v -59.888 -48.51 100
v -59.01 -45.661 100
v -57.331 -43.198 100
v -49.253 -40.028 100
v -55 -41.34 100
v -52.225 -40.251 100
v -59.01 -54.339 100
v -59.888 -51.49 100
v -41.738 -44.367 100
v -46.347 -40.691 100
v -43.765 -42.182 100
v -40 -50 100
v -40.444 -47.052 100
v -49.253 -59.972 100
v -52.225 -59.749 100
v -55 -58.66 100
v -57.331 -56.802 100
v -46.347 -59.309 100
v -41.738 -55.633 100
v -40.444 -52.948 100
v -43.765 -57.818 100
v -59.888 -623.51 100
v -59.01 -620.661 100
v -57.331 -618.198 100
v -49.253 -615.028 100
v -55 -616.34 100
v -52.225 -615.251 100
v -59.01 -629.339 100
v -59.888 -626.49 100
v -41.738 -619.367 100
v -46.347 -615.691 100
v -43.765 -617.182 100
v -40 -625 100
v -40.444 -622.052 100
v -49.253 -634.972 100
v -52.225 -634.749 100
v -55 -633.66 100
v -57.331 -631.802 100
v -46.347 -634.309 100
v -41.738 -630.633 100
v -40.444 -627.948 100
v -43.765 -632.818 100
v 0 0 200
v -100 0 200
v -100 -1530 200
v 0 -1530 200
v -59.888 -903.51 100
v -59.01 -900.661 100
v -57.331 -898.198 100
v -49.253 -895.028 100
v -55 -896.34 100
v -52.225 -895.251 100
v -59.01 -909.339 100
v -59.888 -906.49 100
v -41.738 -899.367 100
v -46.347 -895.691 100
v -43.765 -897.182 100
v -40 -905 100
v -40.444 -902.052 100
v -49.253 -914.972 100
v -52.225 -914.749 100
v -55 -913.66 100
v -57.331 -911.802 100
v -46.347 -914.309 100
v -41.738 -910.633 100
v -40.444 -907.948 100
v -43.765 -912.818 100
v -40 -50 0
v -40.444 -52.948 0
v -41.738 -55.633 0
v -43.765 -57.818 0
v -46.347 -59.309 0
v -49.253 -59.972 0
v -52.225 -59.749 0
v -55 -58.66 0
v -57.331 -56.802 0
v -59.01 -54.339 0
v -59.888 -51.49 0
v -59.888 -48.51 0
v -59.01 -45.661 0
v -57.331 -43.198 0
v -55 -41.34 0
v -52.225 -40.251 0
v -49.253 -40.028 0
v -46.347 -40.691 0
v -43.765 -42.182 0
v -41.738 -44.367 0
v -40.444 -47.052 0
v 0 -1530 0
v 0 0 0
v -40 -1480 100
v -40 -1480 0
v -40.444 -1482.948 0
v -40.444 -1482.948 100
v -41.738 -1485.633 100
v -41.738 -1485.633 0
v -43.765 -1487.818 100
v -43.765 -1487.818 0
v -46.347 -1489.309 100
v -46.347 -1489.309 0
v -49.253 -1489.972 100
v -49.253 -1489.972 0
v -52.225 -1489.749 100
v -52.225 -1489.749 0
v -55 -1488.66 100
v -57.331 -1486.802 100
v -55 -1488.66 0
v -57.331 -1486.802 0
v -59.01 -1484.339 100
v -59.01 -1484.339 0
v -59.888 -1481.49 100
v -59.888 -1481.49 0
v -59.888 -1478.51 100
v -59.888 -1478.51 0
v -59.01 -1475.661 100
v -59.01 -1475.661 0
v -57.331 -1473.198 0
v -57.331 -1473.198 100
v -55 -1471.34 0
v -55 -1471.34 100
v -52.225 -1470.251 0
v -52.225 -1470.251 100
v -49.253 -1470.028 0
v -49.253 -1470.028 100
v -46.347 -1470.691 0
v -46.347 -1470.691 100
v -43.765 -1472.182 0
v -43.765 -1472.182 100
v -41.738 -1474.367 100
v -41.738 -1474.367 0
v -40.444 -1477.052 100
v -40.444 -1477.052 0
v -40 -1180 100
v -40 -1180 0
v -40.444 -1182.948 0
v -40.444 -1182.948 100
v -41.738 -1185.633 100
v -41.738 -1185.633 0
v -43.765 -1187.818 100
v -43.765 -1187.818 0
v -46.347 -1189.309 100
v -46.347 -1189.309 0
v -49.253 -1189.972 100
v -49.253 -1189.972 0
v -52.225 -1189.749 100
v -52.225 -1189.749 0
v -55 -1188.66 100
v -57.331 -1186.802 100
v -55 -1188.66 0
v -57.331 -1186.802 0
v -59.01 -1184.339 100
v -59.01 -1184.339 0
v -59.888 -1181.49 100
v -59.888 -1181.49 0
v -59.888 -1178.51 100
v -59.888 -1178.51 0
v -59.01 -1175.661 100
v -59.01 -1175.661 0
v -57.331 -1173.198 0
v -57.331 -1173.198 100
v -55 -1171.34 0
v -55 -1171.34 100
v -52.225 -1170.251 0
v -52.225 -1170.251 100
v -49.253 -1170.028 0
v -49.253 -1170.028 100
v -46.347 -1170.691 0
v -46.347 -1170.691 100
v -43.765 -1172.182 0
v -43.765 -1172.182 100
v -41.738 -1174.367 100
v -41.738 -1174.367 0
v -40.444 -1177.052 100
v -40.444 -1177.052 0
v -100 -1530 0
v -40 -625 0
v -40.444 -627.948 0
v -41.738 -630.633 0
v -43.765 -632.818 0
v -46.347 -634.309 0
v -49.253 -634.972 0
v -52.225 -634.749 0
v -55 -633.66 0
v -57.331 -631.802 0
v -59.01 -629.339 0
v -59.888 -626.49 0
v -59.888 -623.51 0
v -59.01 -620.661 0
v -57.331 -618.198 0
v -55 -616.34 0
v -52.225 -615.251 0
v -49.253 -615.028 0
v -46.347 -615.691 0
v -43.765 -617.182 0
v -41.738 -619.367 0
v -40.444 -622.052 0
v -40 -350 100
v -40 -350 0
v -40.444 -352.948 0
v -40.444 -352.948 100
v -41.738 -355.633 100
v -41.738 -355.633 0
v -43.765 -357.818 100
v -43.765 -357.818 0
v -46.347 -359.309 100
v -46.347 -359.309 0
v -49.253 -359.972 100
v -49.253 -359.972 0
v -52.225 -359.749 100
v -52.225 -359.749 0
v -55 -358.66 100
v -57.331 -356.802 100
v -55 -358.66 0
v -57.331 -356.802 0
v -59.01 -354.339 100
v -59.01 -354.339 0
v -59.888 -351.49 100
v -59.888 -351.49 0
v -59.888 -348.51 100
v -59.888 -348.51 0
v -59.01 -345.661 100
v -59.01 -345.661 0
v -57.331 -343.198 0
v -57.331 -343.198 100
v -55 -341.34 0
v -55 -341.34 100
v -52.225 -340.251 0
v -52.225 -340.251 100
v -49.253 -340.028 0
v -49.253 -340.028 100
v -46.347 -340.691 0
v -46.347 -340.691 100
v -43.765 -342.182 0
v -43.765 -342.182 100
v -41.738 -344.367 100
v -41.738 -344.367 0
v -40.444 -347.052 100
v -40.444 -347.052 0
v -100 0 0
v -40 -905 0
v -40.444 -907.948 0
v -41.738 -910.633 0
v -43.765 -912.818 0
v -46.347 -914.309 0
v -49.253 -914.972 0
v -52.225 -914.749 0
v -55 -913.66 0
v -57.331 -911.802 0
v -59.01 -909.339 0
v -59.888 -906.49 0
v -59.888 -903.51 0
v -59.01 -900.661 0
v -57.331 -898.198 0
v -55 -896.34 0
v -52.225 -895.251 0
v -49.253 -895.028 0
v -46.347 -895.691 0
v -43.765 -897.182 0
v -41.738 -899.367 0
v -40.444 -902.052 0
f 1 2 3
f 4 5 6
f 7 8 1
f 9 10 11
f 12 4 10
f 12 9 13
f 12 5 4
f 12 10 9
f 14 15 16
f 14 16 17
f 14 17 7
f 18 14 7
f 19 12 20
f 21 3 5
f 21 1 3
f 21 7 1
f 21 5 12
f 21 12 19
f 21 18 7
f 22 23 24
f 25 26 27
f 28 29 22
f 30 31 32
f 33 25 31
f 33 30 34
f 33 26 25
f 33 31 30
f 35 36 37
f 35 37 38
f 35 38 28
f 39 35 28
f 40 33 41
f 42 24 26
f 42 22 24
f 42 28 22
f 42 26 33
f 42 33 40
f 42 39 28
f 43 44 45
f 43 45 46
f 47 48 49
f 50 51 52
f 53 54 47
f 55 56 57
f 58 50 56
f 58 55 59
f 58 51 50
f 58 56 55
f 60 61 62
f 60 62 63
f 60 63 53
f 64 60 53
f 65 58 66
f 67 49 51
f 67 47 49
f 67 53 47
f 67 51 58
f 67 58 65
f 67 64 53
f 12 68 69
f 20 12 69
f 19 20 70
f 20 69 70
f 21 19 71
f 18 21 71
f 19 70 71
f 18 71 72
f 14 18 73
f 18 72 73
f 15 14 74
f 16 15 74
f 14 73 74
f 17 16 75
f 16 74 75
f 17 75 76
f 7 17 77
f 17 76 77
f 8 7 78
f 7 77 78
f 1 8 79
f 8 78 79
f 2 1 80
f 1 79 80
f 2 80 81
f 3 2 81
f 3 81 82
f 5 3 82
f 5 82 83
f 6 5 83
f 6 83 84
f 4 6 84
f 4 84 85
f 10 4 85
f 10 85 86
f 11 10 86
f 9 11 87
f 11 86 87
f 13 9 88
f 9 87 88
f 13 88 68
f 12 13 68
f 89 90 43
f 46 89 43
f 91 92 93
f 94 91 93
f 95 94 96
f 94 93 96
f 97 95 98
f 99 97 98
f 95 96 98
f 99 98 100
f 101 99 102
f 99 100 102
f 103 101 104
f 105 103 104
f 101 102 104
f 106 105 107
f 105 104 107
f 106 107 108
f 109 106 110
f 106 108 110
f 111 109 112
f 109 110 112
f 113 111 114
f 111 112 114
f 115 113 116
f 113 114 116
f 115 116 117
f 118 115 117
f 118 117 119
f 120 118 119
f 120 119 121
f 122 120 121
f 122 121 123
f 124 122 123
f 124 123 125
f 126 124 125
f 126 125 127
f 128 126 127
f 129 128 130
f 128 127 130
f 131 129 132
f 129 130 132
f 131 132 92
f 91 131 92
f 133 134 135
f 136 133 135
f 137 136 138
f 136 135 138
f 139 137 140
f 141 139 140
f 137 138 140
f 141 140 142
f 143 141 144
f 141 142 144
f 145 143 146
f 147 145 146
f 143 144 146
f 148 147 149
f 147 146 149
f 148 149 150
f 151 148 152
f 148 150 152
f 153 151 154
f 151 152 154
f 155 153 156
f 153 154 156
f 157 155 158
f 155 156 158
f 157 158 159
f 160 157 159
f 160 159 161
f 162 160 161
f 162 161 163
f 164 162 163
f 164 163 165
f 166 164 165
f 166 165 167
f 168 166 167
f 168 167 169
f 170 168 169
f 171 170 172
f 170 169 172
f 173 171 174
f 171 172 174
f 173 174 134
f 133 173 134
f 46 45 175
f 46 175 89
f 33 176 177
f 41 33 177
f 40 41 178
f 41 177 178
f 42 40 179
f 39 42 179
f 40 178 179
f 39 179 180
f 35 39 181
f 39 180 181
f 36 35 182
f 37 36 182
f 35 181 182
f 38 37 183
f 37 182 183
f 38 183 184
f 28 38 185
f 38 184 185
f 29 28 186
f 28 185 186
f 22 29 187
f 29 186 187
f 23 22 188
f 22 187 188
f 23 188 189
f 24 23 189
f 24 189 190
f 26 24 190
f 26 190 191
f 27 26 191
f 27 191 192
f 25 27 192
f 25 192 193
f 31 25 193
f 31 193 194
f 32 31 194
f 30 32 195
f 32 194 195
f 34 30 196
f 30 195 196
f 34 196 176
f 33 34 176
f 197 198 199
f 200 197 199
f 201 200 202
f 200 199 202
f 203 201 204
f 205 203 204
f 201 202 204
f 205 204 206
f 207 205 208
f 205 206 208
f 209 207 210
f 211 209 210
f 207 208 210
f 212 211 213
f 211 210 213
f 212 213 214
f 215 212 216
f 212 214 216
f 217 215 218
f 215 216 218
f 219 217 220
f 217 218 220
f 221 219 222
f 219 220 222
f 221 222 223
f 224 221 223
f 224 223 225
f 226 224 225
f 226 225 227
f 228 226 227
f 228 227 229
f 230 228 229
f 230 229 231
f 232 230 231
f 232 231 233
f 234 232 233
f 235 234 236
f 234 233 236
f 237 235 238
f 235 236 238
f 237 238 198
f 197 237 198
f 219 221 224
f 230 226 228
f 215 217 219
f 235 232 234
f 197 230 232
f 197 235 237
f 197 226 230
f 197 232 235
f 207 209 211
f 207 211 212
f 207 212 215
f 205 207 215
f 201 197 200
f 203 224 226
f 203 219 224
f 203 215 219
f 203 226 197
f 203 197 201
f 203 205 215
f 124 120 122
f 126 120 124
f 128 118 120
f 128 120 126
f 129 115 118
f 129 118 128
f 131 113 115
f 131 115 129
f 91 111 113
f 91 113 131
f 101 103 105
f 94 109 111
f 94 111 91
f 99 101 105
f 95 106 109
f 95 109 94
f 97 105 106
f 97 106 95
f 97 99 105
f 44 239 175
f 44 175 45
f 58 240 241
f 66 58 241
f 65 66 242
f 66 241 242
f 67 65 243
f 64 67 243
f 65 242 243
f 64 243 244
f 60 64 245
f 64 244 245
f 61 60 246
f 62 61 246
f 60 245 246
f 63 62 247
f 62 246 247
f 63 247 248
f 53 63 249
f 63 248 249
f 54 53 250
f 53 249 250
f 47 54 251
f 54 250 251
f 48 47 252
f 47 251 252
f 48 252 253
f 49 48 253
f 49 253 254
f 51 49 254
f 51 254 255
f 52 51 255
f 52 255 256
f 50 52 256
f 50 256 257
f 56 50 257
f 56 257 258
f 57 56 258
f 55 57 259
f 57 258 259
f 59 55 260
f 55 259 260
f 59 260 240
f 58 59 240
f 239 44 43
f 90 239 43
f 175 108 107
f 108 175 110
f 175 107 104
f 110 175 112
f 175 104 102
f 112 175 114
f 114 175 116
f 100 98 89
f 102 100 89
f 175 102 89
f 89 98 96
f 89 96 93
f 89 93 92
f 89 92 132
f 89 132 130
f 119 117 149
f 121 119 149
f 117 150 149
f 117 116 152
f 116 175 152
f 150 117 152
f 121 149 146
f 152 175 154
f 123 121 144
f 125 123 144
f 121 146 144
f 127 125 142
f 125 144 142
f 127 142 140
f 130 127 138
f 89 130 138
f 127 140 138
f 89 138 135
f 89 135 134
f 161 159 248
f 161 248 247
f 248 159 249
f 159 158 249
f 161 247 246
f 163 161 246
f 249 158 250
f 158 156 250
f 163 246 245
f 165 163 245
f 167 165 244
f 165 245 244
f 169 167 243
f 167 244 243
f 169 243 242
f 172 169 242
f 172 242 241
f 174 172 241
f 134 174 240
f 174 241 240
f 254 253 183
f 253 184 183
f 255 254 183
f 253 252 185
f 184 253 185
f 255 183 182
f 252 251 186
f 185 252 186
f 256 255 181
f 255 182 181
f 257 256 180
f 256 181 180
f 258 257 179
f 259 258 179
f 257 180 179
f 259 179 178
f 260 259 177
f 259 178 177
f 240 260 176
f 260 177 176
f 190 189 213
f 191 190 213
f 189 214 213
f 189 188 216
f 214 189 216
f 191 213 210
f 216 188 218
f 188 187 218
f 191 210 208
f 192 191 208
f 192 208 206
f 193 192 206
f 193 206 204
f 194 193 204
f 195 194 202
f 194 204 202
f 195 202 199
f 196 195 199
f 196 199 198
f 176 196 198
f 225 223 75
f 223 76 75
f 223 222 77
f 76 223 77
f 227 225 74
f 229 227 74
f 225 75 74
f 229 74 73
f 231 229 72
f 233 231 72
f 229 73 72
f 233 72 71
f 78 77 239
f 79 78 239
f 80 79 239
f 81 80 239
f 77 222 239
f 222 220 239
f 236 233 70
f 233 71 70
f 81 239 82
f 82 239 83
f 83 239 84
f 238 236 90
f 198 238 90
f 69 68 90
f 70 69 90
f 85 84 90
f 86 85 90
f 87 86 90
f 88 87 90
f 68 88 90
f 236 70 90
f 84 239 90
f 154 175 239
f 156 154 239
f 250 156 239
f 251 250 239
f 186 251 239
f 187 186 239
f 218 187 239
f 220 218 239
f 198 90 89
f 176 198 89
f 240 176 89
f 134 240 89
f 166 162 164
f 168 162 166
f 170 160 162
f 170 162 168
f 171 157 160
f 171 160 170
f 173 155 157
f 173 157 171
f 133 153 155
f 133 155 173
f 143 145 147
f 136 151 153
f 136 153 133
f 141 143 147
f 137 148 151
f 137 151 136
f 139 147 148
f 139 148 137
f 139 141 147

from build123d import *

# Parameters (mm, degrees)
F0_W     = 100
F0_H     = 200
F1_DEPTH = 1530
F2_R     = 10
F3_DEPTH = 100


with BuildPart() as f1:
    # F0 (on Front) → F1 (new body)
    with BuildSketch(Plane.XZ):
        with Locations((-50, 100)):
            Rectangle(F0_W, F0_H)
    extrude(amount=F1_DEPTH)

    # F2 (on face) → F3 (cut)
    with BuildSketch(Plane(origin=(0, 0, 0), x_dir=(1, 0, 0), z_dir=(0, 0, -1))):
        with Locations((-50, 1180)):
            Circle(F2_R)
        with Locations((-50, 905)):
            Circle(F2_R)
        with Locations((-50, 625)):
            Circle(F2_R)
        with Locations((-50, 350)):
            Circle(F2_R)
        with Locations((-50, 1480)):
            Circle(F2_R)
        with Locations((-50, 50)):
            Circle(F2_R)
    extrude(amount=-F3_DEPTH, mode=Mode.SUBTRACT)


solid = f1.part
